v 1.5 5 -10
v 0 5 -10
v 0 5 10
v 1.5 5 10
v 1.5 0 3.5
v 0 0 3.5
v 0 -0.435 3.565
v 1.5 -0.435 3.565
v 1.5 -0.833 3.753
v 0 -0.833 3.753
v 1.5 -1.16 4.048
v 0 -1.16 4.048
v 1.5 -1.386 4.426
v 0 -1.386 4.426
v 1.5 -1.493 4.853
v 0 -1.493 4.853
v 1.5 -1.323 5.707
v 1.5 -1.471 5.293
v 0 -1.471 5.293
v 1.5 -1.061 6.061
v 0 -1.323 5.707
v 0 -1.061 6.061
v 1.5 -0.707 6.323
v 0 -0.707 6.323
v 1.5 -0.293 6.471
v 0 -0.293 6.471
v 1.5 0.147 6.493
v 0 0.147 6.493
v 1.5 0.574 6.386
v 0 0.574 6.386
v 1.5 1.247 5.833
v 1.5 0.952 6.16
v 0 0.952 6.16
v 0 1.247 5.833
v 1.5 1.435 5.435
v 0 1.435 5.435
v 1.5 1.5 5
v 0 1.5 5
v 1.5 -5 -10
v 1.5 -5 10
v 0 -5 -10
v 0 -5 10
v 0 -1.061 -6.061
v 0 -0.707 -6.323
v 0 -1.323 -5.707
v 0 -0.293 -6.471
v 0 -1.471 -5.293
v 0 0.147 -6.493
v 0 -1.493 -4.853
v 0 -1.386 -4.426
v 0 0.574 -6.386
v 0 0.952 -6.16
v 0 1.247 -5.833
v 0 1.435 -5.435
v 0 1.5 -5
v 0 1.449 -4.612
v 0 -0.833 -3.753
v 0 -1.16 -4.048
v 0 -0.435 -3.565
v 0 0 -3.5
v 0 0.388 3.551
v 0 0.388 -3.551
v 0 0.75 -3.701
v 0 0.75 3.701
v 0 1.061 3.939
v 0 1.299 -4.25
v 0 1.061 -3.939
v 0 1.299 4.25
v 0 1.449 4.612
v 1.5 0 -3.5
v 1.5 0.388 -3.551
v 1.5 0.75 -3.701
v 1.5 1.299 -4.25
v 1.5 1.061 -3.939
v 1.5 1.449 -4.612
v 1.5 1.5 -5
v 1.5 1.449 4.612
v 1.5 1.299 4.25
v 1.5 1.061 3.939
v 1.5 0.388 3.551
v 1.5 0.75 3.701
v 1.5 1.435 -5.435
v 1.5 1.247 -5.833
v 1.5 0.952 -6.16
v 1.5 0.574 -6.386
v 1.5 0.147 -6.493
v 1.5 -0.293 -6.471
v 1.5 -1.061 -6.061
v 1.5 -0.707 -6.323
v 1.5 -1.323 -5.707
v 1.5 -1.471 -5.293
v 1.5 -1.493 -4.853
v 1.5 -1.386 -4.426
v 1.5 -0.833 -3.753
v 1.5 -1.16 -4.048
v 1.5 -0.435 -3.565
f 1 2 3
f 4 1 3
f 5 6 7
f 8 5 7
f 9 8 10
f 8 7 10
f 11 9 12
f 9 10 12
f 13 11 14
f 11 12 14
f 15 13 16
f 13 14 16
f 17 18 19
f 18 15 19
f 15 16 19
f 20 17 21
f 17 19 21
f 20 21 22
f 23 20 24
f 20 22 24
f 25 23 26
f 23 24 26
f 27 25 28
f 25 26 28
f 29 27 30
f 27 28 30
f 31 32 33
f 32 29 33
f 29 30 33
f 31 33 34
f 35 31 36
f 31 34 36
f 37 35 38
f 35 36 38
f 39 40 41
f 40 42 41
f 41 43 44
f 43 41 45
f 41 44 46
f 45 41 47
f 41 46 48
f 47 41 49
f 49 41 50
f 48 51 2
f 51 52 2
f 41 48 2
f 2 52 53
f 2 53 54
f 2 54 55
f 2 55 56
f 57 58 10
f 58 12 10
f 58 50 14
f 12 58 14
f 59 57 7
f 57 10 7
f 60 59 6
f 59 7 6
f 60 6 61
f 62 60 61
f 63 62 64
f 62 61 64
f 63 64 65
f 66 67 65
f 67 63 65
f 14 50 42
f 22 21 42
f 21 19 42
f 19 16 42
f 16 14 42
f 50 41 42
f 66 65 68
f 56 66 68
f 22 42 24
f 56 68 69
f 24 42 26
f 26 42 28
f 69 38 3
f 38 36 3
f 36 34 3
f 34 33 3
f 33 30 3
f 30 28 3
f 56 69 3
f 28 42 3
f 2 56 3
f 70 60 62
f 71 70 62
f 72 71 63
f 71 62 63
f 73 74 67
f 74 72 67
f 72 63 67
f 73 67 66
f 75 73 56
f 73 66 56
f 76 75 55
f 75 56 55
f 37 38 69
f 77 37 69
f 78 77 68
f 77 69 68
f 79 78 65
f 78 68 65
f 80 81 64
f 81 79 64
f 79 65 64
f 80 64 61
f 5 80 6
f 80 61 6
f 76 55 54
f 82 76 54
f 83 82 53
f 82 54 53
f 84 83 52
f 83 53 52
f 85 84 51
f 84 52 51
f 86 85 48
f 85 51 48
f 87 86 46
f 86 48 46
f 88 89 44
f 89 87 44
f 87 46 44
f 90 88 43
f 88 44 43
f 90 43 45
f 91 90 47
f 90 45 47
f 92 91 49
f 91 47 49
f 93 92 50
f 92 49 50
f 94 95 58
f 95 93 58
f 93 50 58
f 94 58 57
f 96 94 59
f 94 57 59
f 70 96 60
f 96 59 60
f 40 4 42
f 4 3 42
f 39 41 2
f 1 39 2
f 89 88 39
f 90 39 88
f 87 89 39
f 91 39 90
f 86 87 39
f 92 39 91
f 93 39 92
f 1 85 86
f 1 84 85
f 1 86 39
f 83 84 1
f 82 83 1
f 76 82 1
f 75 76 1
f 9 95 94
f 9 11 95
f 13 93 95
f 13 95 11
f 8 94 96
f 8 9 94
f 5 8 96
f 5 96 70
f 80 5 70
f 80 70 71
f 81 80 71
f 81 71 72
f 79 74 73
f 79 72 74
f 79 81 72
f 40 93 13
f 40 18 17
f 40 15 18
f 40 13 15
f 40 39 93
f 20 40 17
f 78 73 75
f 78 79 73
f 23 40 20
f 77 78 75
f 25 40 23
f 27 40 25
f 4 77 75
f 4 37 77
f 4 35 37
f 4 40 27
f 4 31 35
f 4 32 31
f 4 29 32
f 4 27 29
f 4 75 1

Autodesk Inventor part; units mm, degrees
ref_plane "YZ Plane" through (0, 0, 0) normal (1, 0, 0) x (0, 1, 0)
ref_plane "XZ Plane" through (0, 0, 0) normal (0, 1, 0) x (-1, 0, 0)
ref_plane "XY Plane" through (0, 0, 0) normal (0, 0, 1) x (1, 0, 0)
sketch "Sketch1" plane through (0, 0, 0) normal (1, 0, 0) x (0, 1, 0)
  line L0 (5, 10) -> (-5, 10)
  line L1 (-5, 10) -> (-5, -10)
  line L2 (-5, -10) -> (5, -10)
  line L3 (5, -10) -> (5, 10)
  line L4 (5, 10) -> (-5, -10) construction
  line L5 (-5, 10) -> (5, -10) construction
  line L6 (0, 0) -> (0, -5)
  line L7 (0, -5) -> (0, 5)
  circle A0 centre (0, 5) radius 1.5
  circle A1 centre (0, -5) radius 1.5
  dimension "d0" = 10
  dimension "d1" = 20
  dimension "d2" = 5
  dimension "d3" = 10
  dimension "d4" = 3
  dimension "d5" = 3
extrude "Extrusion1" add sketch "Sketch1" along normal blind 1.5
properties part number "kundi"
